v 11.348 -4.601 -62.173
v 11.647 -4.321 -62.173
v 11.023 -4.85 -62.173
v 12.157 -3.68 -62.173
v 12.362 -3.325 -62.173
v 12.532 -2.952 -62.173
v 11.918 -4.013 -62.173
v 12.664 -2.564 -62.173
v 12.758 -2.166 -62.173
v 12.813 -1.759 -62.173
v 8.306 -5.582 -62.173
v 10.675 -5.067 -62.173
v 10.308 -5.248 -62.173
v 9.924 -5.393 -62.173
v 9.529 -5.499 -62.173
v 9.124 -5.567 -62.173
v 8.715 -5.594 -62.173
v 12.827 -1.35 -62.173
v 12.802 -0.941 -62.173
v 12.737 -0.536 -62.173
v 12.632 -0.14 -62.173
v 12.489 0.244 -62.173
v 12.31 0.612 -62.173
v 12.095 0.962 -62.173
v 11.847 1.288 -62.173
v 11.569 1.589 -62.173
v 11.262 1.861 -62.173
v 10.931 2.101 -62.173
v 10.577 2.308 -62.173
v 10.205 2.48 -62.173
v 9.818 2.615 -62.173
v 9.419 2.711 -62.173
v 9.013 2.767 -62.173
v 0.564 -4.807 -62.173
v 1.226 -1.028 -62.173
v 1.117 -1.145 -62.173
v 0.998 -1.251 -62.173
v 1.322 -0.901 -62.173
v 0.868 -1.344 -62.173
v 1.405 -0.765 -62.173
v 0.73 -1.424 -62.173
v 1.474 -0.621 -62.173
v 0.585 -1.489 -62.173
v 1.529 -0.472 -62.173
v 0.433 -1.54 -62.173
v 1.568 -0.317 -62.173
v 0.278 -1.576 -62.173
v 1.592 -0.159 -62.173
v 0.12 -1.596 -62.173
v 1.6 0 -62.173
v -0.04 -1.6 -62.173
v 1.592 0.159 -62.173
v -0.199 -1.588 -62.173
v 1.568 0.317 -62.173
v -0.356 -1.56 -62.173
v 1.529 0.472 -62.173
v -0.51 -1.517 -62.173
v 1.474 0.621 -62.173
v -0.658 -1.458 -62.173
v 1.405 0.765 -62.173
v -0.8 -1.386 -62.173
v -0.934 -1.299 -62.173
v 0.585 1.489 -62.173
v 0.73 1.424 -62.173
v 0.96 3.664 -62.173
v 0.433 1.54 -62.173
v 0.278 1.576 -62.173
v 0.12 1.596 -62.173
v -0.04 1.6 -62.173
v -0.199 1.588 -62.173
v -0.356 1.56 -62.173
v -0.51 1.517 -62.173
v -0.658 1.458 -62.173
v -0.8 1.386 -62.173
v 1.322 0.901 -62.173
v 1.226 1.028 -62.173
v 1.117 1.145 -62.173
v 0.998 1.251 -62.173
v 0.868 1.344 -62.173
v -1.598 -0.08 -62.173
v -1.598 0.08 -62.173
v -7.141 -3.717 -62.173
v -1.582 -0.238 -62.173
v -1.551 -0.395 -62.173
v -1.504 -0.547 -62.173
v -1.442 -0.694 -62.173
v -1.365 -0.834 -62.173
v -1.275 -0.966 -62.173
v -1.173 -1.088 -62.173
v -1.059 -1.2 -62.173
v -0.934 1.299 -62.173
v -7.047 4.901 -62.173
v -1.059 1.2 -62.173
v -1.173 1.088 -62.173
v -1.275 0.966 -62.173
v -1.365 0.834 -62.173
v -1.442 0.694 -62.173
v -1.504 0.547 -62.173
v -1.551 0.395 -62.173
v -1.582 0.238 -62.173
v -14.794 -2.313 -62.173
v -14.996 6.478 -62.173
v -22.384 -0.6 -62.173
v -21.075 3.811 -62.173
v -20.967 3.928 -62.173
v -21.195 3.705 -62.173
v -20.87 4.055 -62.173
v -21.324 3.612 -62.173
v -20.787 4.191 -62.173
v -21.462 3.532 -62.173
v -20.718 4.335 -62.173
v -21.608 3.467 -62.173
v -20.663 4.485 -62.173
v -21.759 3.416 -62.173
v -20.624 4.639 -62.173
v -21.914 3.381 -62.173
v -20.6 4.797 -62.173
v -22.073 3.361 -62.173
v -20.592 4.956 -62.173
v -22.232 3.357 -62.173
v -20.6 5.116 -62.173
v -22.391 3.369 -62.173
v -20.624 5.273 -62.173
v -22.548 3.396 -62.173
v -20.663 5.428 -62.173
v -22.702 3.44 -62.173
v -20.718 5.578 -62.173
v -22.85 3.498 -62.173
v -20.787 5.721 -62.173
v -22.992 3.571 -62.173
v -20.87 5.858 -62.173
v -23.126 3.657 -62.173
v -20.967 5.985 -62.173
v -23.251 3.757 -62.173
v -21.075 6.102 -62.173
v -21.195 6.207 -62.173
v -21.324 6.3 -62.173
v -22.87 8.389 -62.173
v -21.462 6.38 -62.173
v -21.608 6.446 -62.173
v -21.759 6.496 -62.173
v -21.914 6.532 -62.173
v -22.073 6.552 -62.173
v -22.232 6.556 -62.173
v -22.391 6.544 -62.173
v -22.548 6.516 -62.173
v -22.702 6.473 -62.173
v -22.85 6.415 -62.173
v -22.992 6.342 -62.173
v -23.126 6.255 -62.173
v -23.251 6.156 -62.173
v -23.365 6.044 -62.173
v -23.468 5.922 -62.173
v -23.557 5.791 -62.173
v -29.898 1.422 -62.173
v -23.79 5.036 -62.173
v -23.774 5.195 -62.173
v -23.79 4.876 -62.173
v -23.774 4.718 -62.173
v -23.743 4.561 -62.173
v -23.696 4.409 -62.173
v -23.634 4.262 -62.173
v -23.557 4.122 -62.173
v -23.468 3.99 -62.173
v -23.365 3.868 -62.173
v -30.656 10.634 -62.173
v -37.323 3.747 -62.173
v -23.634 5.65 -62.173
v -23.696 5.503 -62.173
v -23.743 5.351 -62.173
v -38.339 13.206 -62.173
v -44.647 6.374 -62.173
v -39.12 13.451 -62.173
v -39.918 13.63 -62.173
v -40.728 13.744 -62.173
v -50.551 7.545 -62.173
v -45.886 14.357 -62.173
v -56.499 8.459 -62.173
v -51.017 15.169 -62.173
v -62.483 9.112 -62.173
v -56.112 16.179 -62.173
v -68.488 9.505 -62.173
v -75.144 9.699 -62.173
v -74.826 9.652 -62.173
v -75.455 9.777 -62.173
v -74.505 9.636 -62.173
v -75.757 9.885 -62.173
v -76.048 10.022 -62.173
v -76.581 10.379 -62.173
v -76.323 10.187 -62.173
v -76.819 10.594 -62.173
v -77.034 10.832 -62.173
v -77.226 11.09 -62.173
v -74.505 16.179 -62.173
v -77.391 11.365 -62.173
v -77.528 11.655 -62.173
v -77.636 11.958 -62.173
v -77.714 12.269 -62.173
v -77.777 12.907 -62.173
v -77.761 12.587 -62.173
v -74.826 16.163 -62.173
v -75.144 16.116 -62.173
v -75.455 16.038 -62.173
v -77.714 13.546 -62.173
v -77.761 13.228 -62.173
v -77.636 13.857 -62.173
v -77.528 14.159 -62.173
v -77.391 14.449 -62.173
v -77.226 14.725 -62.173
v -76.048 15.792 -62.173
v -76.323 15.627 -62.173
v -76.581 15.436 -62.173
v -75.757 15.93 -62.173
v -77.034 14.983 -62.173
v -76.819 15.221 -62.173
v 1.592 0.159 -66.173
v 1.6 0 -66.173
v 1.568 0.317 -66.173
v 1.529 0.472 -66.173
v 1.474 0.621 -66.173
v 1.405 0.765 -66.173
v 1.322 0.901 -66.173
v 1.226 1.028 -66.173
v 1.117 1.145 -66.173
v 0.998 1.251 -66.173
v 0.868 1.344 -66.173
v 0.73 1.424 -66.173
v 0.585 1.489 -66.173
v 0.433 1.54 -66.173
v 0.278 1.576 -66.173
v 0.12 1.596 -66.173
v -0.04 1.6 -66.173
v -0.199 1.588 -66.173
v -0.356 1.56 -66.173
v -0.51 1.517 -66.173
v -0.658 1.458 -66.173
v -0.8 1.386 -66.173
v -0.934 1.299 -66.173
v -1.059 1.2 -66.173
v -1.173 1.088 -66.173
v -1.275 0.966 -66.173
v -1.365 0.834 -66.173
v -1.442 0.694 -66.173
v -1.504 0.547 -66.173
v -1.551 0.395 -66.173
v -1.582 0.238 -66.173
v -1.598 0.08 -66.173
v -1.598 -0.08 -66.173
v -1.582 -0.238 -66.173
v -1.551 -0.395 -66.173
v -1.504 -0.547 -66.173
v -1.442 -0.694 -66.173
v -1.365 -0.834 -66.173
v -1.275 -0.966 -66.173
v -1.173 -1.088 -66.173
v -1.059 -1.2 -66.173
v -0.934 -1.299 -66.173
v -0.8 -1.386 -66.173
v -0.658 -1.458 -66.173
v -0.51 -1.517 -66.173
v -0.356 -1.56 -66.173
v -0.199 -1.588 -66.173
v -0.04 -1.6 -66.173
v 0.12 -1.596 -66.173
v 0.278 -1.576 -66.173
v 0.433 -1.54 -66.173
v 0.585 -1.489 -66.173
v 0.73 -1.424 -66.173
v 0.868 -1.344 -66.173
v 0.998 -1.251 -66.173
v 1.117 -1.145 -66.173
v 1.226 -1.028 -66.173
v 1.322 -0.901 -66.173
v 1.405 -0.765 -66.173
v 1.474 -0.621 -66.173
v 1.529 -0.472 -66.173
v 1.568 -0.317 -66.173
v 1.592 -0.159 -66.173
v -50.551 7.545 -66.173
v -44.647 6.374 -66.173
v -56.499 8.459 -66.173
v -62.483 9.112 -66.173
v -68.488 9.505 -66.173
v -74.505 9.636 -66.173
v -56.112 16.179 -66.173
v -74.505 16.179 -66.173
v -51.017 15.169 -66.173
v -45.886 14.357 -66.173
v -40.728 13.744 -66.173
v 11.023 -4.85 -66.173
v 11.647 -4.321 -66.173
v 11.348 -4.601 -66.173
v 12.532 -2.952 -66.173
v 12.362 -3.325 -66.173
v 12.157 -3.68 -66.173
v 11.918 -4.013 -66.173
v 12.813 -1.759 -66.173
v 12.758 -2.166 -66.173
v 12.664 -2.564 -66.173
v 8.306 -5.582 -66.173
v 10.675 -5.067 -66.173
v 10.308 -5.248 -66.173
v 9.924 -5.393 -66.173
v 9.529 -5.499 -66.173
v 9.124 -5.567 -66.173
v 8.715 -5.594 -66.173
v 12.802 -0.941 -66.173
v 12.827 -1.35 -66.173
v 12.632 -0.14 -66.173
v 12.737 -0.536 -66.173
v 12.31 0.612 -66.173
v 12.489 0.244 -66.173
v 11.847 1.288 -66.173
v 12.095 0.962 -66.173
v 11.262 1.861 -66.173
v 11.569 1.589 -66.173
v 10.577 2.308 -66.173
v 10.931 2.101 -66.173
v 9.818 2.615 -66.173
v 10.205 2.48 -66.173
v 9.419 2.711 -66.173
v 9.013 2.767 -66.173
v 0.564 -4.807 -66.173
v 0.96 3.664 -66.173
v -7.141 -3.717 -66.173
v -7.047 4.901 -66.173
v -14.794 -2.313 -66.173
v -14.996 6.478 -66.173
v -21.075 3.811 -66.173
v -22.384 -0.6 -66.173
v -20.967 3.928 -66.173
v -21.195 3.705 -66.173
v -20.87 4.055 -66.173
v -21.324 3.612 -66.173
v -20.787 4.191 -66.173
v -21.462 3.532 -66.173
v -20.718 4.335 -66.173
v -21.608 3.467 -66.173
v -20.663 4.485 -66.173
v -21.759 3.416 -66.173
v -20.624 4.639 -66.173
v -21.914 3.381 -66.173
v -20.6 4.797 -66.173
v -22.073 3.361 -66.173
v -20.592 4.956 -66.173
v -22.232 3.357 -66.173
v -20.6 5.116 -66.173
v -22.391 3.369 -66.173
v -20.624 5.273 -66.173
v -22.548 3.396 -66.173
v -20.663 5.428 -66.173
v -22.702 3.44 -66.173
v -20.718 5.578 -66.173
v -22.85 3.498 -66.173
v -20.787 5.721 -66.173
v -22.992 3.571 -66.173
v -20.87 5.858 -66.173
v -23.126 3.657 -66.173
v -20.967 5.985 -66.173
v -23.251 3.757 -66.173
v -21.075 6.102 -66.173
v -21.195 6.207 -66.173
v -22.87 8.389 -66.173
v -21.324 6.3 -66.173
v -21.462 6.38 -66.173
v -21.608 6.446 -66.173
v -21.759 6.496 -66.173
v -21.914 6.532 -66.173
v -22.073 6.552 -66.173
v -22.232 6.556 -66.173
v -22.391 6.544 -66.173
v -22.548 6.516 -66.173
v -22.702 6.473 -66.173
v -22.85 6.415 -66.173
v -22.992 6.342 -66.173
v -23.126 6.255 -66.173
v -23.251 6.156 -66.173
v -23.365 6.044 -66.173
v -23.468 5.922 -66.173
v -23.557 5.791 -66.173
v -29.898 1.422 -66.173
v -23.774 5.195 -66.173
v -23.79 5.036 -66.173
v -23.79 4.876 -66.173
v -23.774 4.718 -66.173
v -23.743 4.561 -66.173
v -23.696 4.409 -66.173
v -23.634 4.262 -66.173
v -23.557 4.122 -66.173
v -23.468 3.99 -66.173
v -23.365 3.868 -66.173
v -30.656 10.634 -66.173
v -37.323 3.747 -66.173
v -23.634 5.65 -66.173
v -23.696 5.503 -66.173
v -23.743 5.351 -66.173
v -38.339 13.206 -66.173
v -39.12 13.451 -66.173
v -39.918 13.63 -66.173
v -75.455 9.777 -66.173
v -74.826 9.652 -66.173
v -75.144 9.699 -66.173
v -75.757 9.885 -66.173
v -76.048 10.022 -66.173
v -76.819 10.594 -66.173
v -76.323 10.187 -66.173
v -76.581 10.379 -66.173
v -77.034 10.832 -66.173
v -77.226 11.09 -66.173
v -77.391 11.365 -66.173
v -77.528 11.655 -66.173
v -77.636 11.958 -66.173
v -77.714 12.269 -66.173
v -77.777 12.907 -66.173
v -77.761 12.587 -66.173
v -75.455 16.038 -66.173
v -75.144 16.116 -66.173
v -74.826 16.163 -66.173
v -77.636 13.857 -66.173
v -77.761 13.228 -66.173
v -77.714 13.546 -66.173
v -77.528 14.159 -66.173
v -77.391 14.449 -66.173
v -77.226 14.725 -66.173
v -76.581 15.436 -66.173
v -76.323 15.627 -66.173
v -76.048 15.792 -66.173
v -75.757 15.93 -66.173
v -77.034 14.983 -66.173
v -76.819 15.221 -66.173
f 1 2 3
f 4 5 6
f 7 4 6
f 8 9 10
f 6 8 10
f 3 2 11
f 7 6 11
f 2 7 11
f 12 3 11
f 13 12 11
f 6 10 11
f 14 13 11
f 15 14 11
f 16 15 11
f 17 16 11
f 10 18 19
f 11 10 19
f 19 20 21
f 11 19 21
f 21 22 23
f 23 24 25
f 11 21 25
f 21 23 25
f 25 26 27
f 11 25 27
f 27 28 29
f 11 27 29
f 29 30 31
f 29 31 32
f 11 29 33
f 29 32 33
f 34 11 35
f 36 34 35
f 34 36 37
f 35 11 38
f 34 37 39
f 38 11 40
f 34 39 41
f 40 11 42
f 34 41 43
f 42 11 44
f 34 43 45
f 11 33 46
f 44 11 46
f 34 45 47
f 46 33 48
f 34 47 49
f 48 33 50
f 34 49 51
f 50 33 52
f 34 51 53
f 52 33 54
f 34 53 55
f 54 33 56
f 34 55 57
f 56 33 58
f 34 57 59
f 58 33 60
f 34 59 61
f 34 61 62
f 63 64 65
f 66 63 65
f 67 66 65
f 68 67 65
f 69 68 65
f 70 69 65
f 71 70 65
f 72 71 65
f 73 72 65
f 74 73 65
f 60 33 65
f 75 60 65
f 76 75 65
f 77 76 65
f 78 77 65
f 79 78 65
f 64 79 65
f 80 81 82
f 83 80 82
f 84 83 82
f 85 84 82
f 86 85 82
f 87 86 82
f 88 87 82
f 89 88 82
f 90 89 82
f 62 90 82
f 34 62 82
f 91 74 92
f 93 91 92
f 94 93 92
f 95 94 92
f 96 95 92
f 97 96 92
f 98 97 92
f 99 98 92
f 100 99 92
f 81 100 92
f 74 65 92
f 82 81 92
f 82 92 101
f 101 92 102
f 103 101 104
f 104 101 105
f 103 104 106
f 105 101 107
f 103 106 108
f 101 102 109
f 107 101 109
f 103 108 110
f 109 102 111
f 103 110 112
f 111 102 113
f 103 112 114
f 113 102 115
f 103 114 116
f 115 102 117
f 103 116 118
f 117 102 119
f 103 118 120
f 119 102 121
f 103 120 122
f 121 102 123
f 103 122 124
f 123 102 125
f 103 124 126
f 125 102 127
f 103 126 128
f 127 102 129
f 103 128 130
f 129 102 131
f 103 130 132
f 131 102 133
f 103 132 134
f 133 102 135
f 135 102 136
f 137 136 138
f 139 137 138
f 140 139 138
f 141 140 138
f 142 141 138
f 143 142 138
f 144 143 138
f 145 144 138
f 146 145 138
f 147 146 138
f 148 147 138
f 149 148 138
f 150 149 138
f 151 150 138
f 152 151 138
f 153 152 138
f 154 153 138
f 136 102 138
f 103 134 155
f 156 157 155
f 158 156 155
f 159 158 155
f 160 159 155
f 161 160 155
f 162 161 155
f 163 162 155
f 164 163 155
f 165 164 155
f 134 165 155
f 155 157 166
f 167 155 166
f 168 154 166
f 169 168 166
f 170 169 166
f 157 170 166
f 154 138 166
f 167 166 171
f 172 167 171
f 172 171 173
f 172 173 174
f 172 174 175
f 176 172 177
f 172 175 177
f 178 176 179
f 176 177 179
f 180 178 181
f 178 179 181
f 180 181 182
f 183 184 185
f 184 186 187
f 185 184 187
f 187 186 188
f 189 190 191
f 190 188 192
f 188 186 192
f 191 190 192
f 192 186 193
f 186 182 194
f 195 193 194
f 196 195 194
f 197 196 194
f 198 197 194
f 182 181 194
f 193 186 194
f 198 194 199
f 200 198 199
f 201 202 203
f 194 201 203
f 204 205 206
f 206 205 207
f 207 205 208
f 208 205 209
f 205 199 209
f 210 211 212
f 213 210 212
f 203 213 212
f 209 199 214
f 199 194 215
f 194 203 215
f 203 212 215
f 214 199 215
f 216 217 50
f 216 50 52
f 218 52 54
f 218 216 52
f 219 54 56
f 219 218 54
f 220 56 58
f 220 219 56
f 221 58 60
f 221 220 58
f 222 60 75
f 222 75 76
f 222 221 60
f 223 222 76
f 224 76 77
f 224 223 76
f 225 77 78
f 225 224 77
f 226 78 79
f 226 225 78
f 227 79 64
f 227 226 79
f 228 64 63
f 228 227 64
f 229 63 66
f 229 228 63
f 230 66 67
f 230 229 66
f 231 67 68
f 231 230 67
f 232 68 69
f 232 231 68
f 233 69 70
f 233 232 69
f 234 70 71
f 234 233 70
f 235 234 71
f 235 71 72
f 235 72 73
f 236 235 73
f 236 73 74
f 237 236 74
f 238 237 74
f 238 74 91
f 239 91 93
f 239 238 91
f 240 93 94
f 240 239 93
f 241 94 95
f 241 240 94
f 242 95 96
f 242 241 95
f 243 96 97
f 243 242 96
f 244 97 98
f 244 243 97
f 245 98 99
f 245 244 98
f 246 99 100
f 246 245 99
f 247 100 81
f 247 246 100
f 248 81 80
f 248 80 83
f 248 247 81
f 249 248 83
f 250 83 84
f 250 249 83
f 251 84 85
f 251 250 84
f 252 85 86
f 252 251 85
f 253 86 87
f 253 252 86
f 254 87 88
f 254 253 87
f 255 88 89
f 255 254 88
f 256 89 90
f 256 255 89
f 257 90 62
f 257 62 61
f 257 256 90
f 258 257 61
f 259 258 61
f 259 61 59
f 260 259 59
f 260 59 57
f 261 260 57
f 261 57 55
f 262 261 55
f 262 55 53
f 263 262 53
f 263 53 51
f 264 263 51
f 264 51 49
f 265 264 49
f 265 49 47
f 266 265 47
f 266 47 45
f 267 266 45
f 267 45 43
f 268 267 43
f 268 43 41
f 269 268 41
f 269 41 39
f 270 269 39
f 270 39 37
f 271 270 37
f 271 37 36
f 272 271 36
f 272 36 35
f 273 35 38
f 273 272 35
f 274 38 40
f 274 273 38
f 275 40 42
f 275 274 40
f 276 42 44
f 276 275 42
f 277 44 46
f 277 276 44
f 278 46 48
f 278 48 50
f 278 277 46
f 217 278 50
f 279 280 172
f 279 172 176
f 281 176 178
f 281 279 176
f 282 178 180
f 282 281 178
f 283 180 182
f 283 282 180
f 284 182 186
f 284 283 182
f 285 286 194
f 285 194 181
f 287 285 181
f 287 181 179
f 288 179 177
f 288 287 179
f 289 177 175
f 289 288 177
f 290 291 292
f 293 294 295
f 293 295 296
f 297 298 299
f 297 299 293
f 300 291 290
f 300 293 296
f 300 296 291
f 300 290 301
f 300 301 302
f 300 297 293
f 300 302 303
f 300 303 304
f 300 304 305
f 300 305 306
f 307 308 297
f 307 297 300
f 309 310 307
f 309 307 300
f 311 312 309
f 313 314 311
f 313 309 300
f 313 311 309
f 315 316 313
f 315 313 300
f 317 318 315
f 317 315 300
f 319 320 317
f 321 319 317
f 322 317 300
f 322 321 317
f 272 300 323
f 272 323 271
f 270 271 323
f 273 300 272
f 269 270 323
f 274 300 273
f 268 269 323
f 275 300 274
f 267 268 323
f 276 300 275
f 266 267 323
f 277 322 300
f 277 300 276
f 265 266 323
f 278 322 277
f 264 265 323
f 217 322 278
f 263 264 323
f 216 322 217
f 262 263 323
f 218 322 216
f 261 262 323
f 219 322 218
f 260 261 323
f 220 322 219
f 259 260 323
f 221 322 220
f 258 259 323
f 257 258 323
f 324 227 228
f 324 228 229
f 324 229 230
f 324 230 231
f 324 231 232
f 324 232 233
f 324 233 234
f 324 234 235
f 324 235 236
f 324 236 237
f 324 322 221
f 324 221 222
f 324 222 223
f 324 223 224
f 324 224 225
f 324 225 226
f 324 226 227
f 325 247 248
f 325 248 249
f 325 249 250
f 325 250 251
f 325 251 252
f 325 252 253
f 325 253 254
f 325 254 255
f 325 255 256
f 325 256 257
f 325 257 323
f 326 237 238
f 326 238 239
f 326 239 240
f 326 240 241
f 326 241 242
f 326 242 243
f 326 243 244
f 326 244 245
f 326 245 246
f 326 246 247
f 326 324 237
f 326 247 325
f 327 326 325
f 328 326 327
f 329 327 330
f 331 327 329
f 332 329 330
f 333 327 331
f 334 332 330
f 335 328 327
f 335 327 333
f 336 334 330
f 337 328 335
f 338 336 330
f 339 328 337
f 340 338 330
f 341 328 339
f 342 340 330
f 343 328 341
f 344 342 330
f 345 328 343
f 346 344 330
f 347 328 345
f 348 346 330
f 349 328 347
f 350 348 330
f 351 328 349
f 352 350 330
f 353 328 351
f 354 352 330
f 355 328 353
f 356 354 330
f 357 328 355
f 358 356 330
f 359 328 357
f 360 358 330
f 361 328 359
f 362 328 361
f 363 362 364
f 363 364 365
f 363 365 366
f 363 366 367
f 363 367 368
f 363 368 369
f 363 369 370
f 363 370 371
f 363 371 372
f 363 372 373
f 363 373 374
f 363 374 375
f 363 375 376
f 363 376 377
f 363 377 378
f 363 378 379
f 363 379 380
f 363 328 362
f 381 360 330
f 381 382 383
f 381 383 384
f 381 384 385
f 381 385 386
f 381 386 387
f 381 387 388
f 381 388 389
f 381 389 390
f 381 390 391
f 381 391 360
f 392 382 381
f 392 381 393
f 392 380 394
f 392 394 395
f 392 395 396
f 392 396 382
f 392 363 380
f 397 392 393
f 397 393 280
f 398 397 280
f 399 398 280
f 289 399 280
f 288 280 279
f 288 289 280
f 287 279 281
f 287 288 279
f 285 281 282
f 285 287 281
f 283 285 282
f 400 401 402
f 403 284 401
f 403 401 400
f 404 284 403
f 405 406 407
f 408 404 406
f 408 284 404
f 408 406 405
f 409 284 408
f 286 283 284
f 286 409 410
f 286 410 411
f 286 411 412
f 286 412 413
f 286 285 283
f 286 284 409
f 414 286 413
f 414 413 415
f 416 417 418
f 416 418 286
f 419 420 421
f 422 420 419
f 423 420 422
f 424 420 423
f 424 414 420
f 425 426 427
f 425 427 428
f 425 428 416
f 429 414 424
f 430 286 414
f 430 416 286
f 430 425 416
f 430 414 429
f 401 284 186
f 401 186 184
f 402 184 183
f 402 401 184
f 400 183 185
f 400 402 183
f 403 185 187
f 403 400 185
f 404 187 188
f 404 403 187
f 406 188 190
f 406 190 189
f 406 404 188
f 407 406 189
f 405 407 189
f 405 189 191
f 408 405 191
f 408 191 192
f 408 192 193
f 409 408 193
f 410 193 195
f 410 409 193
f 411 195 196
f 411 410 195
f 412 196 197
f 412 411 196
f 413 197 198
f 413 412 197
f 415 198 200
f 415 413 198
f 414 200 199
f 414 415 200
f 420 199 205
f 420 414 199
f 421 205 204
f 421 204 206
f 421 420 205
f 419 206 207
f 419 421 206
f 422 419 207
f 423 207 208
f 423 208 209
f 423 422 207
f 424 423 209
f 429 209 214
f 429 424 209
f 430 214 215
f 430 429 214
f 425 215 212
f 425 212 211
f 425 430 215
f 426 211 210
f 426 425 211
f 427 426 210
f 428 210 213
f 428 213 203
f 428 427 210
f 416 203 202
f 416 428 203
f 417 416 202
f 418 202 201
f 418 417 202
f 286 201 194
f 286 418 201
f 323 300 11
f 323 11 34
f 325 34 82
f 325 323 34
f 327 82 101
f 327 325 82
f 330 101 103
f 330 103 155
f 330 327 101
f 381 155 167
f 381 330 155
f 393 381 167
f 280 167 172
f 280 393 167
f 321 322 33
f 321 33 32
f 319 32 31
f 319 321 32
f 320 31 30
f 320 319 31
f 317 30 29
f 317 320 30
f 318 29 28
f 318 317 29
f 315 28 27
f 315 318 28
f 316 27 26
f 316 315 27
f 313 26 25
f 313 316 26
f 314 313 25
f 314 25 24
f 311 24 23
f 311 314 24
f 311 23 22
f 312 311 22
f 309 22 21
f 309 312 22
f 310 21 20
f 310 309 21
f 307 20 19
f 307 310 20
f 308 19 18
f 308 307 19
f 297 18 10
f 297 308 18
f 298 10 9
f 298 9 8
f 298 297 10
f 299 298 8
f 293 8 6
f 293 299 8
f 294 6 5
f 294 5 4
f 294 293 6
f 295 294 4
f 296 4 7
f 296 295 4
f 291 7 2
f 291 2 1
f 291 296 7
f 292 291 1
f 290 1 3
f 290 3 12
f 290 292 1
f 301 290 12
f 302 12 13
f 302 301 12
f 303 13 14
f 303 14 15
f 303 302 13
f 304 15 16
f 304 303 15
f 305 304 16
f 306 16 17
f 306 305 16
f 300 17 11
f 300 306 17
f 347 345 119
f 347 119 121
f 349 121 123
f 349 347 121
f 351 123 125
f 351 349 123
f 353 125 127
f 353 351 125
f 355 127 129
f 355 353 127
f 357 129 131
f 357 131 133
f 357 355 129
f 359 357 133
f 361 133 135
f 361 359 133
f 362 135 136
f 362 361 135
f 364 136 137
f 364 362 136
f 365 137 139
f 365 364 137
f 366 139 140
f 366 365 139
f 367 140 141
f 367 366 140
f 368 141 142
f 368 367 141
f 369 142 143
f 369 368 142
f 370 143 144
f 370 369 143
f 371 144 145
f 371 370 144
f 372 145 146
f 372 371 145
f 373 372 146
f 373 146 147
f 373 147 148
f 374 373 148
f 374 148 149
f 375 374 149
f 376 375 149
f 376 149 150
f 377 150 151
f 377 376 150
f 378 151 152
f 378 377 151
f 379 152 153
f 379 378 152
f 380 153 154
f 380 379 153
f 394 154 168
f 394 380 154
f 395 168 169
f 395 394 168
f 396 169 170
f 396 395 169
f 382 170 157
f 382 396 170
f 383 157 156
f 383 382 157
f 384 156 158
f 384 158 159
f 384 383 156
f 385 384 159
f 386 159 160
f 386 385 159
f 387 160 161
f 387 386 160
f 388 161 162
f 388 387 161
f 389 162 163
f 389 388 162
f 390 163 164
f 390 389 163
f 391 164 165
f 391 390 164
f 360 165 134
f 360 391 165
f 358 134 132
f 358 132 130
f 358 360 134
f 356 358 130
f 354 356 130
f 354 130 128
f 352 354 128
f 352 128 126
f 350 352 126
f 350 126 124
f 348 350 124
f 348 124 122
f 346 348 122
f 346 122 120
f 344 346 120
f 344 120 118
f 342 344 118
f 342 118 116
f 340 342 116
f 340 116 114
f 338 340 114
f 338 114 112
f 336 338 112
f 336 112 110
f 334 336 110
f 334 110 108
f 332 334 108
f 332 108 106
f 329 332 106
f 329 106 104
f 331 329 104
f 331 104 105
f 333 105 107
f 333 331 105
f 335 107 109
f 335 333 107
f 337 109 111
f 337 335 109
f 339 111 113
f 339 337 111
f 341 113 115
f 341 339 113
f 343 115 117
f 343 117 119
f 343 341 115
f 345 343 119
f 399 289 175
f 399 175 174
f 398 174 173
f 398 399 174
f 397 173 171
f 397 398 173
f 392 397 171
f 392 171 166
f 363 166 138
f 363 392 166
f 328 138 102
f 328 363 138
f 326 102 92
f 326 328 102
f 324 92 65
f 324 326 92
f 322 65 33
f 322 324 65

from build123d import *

# Parameters (mm, degrees)
SKETCH3_R           = 1.6
BOSS_EXTRUDE1_DEPTH = 4


with BuildPart() as part:
    # Sketch3 → Boss-Extrude1 (new body)
    with BuildSketch(Plane(origin=(20.494506969, 51.628779219, -66.172927913), x_dir=(1, 0, 0), z_dir=(0, 0, 1))):
        with BuildLine():
            Line((-95, -35.45), (-76.606413565, -35.45))
            ThreePointArc((-76.606413565, -35.45), (-68.94960795, -36.890649791), (-61.222089264, -37.884429946))
            ThreePointArc((-61.222089264, -37.884429946), (-60.011397218, -38.080084438), (-58.833759818, -38.42246736))
            ThreePointArc((-58.833759818, -38.42246736), (-35.490101097, -45.151223745), (-11.481033396, -48.861645973))
            ThreePointArc((-11.481033396, -48.861645973), (-7.68167997, -53.388127631), (-12.188640475, -57.210617614))
            ThreePointArc((-12.188640475, -57.210617614), (-39.092131211, -53.124111692), (-65.141573254, -45.254936785))
            ThreePointArc((-65.141573254, -45.254936785), (-79.981953338, -42.810785721), (-95, -41.992843223))
            ThreePointArc((-95, -41.992843223), (-98.271421612, -38.721421612), (-95, -35.45))
        make_face()
        with Locations((-42.686731091, -46.672569756)):
            Circle(SKETCH3_R, mode=Mode.SUBTRACT)
        with Locations((-20.494506969, -51.628779219)):
            Circle(SKETCH3_R, mode=Mode.SUBTRACT)
    extrude(amount=BOSS_EXTRUDE1_DEPTH)


solid = part.part
